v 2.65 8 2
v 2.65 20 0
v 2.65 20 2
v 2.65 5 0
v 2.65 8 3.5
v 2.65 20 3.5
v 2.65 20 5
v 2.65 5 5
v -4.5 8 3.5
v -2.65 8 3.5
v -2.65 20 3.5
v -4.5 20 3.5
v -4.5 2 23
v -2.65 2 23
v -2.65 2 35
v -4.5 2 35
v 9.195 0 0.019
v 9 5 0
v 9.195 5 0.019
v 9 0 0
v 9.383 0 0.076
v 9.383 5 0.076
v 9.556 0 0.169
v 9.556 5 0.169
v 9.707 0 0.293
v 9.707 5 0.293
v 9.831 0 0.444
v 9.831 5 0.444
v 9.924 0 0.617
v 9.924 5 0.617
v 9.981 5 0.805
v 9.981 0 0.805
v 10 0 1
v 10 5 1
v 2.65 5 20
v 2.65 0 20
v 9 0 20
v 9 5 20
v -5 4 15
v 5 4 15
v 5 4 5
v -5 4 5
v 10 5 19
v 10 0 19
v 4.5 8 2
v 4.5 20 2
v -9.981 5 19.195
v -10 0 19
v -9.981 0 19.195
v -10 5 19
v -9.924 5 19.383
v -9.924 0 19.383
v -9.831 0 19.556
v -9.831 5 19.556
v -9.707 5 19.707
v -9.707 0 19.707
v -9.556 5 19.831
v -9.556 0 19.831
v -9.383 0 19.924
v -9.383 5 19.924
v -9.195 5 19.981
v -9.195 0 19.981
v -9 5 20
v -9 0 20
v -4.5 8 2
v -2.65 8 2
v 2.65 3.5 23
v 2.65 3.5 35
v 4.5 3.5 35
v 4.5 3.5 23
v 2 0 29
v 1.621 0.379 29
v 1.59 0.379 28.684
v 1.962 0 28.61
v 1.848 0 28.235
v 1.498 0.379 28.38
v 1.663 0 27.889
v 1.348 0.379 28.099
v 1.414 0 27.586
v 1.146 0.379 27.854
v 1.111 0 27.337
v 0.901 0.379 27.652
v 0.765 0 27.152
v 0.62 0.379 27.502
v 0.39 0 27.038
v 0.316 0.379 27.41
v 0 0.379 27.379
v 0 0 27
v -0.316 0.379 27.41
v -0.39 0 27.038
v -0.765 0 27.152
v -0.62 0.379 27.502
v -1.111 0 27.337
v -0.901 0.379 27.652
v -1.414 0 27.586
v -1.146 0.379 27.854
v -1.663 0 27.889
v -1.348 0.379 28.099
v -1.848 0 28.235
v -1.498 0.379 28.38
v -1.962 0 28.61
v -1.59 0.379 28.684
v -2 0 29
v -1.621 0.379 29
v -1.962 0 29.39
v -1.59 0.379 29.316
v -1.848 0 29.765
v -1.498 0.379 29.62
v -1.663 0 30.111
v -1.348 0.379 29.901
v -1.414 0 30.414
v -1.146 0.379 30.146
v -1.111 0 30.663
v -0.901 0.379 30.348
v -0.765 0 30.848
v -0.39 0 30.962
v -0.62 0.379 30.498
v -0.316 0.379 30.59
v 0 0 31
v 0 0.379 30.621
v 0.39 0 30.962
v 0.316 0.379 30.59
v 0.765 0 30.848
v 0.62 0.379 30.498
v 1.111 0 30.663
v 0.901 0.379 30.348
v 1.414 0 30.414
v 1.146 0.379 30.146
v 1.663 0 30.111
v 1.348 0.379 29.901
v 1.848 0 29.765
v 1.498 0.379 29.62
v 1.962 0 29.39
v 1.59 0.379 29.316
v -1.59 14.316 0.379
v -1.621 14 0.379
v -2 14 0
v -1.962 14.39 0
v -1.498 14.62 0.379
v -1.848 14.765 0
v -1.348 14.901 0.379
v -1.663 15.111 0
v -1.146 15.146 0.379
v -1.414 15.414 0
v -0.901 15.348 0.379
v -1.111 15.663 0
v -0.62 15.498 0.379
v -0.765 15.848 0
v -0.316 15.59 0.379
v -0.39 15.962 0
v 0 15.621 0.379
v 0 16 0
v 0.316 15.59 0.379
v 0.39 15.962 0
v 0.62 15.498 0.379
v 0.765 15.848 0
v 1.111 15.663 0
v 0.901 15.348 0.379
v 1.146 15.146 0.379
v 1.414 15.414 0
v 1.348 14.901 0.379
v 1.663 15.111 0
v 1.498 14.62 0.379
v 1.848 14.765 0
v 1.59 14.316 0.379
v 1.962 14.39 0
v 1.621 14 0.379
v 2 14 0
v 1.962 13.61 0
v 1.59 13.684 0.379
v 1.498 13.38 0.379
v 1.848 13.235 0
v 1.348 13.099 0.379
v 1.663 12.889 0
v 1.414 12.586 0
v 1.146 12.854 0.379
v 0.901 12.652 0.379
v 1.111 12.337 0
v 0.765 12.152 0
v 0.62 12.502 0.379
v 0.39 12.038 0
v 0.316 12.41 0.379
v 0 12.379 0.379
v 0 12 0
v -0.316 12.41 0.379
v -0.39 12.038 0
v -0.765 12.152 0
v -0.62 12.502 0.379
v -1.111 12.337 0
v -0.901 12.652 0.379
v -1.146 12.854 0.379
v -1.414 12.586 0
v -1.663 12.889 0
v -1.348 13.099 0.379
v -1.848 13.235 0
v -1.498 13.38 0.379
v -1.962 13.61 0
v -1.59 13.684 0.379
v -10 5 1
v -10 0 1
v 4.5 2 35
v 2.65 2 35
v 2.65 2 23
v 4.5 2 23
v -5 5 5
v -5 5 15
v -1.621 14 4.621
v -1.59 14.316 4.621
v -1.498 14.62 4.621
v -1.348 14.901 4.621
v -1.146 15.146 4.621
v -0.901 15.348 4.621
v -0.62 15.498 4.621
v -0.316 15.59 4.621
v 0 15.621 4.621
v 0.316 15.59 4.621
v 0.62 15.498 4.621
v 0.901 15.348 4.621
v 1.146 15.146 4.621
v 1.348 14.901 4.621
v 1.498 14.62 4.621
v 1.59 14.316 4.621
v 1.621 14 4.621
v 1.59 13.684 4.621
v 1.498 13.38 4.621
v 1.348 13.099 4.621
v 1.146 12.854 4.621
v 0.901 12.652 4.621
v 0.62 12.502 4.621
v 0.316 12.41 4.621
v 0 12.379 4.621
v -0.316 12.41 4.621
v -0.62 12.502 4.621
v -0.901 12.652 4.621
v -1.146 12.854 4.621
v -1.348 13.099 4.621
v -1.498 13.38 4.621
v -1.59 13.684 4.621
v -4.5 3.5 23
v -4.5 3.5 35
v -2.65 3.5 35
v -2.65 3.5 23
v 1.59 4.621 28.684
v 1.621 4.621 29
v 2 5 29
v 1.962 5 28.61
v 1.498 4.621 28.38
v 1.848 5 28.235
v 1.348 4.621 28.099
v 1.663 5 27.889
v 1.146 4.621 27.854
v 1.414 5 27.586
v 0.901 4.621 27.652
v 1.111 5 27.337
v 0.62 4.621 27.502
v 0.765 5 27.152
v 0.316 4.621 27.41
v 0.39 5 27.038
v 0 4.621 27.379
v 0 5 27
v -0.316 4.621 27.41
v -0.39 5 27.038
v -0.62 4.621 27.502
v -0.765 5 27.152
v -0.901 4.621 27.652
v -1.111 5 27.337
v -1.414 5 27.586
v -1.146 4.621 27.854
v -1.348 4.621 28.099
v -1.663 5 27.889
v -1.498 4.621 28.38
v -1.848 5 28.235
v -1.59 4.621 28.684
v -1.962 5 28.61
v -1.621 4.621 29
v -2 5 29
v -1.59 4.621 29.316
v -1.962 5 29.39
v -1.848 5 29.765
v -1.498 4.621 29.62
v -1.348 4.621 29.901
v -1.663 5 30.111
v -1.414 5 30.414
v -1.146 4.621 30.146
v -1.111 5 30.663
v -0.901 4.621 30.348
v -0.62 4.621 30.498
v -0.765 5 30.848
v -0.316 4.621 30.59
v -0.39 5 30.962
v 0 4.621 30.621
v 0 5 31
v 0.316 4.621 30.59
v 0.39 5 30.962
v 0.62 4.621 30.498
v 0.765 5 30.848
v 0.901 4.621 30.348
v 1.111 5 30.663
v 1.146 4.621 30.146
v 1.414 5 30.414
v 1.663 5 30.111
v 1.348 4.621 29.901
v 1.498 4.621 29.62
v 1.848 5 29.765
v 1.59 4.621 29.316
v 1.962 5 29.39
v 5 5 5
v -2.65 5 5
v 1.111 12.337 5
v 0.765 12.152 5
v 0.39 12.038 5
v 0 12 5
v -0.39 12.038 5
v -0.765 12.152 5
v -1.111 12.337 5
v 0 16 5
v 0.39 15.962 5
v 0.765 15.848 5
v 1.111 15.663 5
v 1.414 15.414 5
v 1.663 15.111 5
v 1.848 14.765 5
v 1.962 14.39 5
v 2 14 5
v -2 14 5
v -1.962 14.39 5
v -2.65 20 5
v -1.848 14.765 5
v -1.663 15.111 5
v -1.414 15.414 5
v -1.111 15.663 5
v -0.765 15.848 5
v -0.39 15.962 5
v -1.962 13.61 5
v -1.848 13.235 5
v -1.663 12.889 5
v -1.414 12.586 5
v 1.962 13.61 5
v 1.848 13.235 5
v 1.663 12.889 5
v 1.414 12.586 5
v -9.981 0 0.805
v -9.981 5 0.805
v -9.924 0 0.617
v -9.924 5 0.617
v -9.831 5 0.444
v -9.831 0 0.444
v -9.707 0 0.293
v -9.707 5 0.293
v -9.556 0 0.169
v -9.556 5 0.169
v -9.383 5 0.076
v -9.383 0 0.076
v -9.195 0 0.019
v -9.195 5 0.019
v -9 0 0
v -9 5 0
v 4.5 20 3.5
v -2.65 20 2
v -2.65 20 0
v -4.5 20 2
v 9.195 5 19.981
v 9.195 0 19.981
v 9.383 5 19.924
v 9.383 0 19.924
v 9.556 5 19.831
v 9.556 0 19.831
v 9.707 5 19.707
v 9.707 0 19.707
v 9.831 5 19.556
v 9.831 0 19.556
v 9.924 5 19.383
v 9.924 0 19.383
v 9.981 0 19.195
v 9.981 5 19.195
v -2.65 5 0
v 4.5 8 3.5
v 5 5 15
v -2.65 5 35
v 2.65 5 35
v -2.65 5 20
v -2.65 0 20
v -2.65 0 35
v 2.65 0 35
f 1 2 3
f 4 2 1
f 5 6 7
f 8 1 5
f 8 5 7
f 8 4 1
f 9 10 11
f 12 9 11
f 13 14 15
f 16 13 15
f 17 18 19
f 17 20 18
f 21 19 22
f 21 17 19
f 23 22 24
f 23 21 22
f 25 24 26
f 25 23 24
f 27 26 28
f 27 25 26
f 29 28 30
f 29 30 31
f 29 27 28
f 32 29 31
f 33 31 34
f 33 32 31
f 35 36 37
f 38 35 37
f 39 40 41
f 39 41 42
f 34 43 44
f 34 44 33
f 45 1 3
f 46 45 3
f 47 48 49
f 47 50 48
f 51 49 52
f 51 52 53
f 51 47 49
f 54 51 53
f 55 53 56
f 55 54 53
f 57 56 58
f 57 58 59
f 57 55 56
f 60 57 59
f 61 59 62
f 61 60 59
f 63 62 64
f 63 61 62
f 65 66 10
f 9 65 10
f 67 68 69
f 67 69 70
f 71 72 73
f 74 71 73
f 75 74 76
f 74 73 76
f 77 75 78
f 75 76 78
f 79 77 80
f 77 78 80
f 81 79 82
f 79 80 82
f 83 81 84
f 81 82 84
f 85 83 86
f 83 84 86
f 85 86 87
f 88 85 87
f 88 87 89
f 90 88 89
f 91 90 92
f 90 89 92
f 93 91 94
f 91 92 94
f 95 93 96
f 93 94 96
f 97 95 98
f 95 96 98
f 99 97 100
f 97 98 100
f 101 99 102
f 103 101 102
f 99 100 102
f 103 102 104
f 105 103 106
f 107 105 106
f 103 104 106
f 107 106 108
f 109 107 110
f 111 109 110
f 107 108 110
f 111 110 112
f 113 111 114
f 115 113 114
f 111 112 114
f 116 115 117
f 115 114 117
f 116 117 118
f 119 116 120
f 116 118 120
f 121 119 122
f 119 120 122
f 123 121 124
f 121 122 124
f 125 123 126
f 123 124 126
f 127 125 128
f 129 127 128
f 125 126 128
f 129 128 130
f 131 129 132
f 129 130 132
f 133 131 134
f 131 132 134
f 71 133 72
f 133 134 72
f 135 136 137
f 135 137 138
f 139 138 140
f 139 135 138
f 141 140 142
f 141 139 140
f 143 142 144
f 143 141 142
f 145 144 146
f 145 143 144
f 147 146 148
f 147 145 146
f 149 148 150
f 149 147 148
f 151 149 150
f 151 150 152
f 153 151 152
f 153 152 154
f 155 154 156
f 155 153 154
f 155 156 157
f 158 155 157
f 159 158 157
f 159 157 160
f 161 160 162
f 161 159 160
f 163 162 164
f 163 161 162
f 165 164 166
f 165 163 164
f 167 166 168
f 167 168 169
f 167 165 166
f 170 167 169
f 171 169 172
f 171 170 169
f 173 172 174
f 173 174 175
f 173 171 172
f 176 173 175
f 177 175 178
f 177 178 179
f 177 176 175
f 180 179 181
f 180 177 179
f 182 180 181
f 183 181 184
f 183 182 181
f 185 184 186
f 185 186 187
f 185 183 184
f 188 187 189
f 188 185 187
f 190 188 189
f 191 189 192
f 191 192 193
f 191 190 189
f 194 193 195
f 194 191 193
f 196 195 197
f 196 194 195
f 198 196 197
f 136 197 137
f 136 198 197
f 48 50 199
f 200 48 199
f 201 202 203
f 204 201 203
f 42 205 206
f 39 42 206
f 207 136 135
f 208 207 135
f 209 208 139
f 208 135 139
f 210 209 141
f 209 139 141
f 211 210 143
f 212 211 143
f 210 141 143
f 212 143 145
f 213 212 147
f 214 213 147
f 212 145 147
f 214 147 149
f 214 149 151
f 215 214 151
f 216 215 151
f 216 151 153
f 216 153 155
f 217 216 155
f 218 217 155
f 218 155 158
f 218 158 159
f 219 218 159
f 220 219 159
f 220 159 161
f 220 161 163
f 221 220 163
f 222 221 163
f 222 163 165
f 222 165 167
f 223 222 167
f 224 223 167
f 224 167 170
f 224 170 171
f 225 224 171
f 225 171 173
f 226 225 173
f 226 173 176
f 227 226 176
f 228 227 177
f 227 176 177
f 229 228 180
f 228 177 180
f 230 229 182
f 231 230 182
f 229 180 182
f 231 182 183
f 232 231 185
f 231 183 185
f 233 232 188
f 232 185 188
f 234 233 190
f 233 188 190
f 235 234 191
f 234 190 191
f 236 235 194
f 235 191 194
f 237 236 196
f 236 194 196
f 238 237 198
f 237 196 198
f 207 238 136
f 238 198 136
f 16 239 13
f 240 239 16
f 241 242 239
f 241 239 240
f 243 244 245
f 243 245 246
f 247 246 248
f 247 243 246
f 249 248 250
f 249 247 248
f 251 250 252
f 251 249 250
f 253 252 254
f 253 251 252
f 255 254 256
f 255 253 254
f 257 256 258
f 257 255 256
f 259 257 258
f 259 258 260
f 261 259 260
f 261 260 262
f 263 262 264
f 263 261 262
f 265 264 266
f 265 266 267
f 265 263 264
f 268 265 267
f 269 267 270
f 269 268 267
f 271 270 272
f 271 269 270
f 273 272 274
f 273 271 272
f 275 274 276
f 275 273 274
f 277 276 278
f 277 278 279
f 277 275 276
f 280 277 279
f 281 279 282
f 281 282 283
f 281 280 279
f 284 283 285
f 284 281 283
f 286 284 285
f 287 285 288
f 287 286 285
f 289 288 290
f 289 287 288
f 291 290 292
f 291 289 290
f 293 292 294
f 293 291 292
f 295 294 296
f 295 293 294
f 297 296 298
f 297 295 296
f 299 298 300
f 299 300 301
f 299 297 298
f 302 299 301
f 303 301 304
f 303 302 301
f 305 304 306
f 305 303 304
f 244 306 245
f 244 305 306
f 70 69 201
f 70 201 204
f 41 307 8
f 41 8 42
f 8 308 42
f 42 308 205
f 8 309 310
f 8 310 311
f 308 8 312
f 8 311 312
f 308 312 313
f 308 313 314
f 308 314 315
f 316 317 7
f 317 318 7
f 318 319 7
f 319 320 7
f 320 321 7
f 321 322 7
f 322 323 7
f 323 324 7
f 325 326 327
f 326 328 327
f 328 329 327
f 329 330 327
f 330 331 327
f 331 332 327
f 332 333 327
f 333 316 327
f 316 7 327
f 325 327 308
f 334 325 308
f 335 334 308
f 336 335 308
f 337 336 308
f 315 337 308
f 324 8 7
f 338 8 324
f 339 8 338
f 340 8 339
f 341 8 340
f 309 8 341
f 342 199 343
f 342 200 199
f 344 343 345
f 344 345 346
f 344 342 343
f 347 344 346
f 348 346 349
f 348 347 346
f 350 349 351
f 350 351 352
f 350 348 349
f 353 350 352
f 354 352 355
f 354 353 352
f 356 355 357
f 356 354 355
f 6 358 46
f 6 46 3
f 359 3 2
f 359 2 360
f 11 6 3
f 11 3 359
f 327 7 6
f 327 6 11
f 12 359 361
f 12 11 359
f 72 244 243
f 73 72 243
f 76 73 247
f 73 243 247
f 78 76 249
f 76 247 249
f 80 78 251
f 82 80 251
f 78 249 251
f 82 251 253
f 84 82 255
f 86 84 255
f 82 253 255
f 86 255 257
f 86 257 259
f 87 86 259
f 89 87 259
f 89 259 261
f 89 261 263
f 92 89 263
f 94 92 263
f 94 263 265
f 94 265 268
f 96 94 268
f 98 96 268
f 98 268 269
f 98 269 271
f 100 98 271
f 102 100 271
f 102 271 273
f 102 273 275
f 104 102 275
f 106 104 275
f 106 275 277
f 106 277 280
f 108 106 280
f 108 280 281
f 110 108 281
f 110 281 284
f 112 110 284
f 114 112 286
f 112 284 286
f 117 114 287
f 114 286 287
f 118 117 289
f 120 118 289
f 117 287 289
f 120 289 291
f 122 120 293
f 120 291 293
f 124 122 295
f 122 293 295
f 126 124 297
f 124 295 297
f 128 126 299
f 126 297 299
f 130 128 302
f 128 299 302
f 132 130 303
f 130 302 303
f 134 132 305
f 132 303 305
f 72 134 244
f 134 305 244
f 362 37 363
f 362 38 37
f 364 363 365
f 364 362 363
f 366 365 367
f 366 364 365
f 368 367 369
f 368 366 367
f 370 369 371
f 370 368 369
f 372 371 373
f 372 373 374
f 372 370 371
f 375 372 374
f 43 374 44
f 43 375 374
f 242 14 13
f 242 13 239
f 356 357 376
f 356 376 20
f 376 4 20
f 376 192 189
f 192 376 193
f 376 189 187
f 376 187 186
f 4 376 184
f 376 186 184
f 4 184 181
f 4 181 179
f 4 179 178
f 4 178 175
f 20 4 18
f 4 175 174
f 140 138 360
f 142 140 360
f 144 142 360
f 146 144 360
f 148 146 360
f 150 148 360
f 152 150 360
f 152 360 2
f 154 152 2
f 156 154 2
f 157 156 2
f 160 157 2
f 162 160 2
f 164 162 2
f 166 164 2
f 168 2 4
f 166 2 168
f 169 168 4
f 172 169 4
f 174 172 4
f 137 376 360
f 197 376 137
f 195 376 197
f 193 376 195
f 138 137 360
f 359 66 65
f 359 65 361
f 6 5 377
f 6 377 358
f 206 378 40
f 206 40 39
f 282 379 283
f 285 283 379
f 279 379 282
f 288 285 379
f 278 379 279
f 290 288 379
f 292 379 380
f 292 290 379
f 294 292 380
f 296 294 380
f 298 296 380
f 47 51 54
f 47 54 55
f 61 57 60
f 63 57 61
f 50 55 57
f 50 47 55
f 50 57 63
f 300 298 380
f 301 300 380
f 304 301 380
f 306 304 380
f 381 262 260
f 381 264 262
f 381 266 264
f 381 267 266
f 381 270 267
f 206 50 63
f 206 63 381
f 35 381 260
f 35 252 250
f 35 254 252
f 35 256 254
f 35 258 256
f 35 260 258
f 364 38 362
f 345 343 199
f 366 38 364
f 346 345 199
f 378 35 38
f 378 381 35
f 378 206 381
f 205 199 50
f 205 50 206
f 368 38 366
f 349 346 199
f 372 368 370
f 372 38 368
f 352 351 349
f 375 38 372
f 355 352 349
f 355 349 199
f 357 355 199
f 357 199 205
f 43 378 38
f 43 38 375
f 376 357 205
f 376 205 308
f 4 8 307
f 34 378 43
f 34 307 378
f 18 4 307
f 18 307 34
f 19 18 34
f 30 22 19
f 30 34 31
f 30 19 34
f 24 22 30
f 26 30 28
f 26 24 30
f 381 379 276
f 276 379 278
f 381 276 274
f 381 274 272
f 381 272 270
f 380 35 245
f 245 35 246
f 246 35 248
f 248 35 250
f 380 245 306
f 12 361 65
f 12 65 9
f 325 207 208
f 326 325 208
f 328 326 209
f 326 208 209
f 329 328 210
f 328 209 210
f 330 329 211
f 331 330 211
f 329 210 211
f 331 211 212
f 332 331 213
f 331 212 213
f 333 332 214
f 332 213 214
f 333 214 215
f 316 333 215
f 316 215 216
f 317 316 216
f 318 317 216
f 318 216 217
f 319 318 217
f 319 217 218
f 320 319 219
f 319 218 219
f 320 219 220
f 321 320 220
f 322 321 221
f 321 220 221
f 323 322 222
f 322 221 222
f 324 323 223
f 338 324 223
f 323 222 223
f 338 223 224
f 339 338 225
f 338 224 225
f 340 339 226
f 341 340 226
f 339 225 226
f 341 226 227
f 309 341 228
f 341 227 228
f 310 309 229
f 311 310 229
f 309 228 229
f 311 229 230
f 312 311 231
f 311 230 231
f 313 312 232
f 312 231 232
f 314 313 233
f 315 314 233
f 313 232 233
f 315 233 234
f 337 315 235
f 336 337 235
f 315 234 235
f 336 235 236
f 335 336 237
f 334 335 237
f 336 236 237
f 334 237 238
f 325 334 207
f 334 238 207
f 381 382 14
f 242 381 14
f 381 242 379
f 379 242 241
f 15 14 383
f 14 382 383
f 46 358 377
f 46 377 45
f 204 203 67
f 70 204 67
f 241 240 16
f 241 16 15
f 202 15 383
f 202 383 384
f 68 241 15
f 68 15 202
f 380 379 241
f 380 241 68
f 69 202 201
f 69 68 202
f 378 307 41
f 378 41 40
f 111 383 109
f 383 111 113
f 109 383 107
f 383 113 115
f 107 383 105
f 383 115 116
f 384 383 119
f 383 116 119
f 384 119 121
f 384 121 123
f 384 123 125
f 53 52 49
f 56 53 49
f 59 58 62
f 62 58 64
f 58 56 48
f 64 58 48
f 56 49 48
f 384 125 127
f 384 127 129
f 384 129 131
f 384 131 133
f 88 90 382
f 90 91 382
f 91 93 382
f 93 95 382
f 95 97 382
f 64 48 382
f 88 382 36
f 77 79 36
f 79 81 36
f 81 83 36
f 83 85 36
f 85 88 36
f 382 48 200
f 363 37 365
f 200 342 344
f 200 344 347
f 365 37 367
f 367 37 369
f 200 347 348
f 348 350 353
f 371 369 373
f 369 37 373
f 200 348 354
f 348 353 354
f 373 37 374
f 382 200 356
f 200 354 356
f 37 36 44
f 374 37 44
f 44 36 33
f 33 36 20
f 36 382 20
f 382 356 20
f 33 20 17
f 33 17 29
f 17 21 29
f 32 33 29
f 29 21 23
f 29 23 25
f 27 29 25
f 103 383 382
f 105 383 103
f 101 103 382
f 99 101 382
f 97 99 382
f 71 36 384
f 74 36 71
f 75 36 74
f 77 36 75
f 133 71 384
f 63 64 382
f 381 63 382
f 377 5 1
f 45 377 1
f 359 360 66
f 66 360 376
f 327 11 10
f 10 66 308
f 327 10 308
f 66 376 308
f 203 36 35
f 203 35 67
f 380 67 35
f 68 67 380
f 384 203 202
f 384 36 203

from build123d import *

# Parameters (mm, degrees)
SKETCH1_W                = 20
SKETCH1_H                = 35
BOSS_EXTRUDE1_DEPTH      = 5
SKETCH2_W                = 5.3
SKETCH2_H                = 5
BOSS_EXTRUDE2_DEPTH      = 15
SKETCH3_W                = 10
SKETCH3_H                = 10
CUT_EXTRUDE1_DEPTH       = 1
SKETCH4_W                = 7.35
SKETCH4_H                = 15
CUT_EXTRUDE2_DEPTH       = 21
SKETCH5_W                = 7.35
SKETCH5_H                = 15
CUT_EXTRUDE3_DEPTH       = 21
SKETCH6_W                = 1.5
SKETCH6_H                = 12
BOSS_EXTRUDE3_DEPTH      = 1.85
SKETCH7_W                = 1.5
SKETCH7_H                = 12
BOSS_EXTRUDE4_DEPTH      = 1.85
SKETCH8_W                = 12
SKETCH8_H                = 1.5
BOSS_EXTRUDE5_DEPTH      = 1.85
SKETCH9_W                = 12
SKETCH9_H                = 1.5
BOSS_EXTRUDE6_DEPTH      = 1.85
M3_CLEARANCE_HOLE1_D     = 3.242
M3_CLEARANCE_HOLE1_DEPTH = 20.000025
M3_CLEARANCE_HOLE2_D     = 3.242
M3_CLEARANCE_HOLE2_DEPTH = 5.00005
CHAMFER1_SIZE            = 0.379
FILLET1_R                = 1


with BuildPart() as part:
    # Sketch1 → Boss-Extrude1 (new body)
    with BuildSketch(Plane(origin=(0, 5, 0), x_dir=(1, 0, 0), z_dir=(0, 1, 0))):
        with Locations((0, -17.5)):
            Rectangle(SKETCH1_W, SKETCH1_H)
    extrude(amount=-BOSS_EXTRUDE1_DEPTH)

    # Sketch2 → Boss-Extrude2 (add)
    with BuildSketch(Plane(origin=(0, 5, 0), x_dir=(-1, 0, 0), z_dir=(0, 1, 0))):
        with Locations((0, 2.5)):
            Rectangle(SKETCH2_W, SKETCH2_H)
    extrude(amount=BOSS_EXTRUDE2_DEPTH)

    # Sketch3 → Cut-Extrude1 (cut)
    with BuildSketch(Plane(origin=(0, 5, 0), x_dir=(-1, 0, 0), z_dir=(0, 1, 0))):
        with Locations((0, 10)):
            Rectangle(SKETCH3_W, SKETCH3_H)
    extrude(amount=-CUT_EXTRUDE1_DEPTH, mode=Mode.SUBTRACT)

    # Sketch4 → Cut-Extrude2 (cut, through all)
    with BuildSketch(Plane.XZ):
        with Locations((-6.325, 27.5)):
            Rectangle(SKETCH4_W, SKETCH4_H)
    extrude(amount=-CUT_EXTRUDE2_DEPTH, mode=Mode.SUBTRACT)

    # Sketch5 → Cut-Extrude3 (cut, through all)
    with BuildSketch(Plane.XZ):
        with Locations((6.325, 27.5)):
            Rectangle(SKETCH5_W, SKETCH5_H)
    extrude(amount=-CUT_EXTRUDE3_DEPTH, mode=Mode.SUBTRACT)

    # Sketch6 → Boss-Extrude3 (add)
    with BuildSketch(Plane(origin=(2.65, 0, 0), x_dir=(0, 0, -1), z_dir=(1, 0, 0))):
        with Locations((-2.75, 14)):
            Rectangle(SKETCH6_W, SKETCH6_H)
    extrude(amount=BOSS_EXTRUDE3_DEPTH)

    # Sketch7 → Boss-Extrude4 (add)
    with BuildSketch(Plane.ZY.offset(2.65)):
        with Locations((2.75, 14)):
            Rectangle(SKETCH7_W, SKETCH7_H)
    extrude(amount=BOSS_EXTRUDE4_DEPTH)

    # Sketch8 → Boss-Extrude5 (add)
    with BuildSketch(Plane.ZY.offset(2.65)):
        with Locations((29, 2.75)):
            Rectangle(SKETCH8_W, SKETCH8_H)
    extrude(amount=BOSS_EXTRUDE5_DEPTH)

    # Sketch9 → Boss-Extrude6 (add)
    with BuildSketch(Plane(origin=(2.65, 0, 0), x_dir=(0, 0, -1), z_dir=(1, 0, 0))):
        with Locations((-29, 2.75)):
            Rectangle(SKETCH9_W, SKETCH9_H)
    extrude(amount=BOSS_EXTRUDE6_DEPTH)

    # M3 Clearance Hole1
    with Locations(Plane(origin=(0, 0, 0), x_dir=(-1, 0, 0), z_dir=(0, -1, 0))):
        with Locations((0, -29)):
            Hole(M3_CLEARANCE_HOLE1_D / 2, depth=M3_CLEARANCE_HOLE1_DEPTH)

    # M3 Clearance Hole2
    with Locations(Plane.XY.offset(5)):
        with Locations((0, 14)):
            Hole(M3_CLEARANCE_HOLE2_D / 2, depth=M3_CLEARANCE_HOLE2_DEPTH)

    # Chamfer1
    chamfer1_edges = [part.edges().sort_by_distance(p)[0] for p in [
        (-1.621, 5, 29),
        (-1.621, 0, 29),
        (1.621, 14, 0),
        (1.621, 14, 5),
    ]]
    chamfer(chamfer1_edges, length=CHAMFER1_SIZE)

    # Fillet1
    fillet1_edges = [part.edges().sort_by_distance(p)[0] for p in [
        (-10, 2.5, 20),
        (10, 2.5, 0),
        (10, 2.5, 20),
        (-10, 2.5, 0),
    ]]
    fillet(fillet1_edges, radius=FILLET1_R)


solid = part.part
